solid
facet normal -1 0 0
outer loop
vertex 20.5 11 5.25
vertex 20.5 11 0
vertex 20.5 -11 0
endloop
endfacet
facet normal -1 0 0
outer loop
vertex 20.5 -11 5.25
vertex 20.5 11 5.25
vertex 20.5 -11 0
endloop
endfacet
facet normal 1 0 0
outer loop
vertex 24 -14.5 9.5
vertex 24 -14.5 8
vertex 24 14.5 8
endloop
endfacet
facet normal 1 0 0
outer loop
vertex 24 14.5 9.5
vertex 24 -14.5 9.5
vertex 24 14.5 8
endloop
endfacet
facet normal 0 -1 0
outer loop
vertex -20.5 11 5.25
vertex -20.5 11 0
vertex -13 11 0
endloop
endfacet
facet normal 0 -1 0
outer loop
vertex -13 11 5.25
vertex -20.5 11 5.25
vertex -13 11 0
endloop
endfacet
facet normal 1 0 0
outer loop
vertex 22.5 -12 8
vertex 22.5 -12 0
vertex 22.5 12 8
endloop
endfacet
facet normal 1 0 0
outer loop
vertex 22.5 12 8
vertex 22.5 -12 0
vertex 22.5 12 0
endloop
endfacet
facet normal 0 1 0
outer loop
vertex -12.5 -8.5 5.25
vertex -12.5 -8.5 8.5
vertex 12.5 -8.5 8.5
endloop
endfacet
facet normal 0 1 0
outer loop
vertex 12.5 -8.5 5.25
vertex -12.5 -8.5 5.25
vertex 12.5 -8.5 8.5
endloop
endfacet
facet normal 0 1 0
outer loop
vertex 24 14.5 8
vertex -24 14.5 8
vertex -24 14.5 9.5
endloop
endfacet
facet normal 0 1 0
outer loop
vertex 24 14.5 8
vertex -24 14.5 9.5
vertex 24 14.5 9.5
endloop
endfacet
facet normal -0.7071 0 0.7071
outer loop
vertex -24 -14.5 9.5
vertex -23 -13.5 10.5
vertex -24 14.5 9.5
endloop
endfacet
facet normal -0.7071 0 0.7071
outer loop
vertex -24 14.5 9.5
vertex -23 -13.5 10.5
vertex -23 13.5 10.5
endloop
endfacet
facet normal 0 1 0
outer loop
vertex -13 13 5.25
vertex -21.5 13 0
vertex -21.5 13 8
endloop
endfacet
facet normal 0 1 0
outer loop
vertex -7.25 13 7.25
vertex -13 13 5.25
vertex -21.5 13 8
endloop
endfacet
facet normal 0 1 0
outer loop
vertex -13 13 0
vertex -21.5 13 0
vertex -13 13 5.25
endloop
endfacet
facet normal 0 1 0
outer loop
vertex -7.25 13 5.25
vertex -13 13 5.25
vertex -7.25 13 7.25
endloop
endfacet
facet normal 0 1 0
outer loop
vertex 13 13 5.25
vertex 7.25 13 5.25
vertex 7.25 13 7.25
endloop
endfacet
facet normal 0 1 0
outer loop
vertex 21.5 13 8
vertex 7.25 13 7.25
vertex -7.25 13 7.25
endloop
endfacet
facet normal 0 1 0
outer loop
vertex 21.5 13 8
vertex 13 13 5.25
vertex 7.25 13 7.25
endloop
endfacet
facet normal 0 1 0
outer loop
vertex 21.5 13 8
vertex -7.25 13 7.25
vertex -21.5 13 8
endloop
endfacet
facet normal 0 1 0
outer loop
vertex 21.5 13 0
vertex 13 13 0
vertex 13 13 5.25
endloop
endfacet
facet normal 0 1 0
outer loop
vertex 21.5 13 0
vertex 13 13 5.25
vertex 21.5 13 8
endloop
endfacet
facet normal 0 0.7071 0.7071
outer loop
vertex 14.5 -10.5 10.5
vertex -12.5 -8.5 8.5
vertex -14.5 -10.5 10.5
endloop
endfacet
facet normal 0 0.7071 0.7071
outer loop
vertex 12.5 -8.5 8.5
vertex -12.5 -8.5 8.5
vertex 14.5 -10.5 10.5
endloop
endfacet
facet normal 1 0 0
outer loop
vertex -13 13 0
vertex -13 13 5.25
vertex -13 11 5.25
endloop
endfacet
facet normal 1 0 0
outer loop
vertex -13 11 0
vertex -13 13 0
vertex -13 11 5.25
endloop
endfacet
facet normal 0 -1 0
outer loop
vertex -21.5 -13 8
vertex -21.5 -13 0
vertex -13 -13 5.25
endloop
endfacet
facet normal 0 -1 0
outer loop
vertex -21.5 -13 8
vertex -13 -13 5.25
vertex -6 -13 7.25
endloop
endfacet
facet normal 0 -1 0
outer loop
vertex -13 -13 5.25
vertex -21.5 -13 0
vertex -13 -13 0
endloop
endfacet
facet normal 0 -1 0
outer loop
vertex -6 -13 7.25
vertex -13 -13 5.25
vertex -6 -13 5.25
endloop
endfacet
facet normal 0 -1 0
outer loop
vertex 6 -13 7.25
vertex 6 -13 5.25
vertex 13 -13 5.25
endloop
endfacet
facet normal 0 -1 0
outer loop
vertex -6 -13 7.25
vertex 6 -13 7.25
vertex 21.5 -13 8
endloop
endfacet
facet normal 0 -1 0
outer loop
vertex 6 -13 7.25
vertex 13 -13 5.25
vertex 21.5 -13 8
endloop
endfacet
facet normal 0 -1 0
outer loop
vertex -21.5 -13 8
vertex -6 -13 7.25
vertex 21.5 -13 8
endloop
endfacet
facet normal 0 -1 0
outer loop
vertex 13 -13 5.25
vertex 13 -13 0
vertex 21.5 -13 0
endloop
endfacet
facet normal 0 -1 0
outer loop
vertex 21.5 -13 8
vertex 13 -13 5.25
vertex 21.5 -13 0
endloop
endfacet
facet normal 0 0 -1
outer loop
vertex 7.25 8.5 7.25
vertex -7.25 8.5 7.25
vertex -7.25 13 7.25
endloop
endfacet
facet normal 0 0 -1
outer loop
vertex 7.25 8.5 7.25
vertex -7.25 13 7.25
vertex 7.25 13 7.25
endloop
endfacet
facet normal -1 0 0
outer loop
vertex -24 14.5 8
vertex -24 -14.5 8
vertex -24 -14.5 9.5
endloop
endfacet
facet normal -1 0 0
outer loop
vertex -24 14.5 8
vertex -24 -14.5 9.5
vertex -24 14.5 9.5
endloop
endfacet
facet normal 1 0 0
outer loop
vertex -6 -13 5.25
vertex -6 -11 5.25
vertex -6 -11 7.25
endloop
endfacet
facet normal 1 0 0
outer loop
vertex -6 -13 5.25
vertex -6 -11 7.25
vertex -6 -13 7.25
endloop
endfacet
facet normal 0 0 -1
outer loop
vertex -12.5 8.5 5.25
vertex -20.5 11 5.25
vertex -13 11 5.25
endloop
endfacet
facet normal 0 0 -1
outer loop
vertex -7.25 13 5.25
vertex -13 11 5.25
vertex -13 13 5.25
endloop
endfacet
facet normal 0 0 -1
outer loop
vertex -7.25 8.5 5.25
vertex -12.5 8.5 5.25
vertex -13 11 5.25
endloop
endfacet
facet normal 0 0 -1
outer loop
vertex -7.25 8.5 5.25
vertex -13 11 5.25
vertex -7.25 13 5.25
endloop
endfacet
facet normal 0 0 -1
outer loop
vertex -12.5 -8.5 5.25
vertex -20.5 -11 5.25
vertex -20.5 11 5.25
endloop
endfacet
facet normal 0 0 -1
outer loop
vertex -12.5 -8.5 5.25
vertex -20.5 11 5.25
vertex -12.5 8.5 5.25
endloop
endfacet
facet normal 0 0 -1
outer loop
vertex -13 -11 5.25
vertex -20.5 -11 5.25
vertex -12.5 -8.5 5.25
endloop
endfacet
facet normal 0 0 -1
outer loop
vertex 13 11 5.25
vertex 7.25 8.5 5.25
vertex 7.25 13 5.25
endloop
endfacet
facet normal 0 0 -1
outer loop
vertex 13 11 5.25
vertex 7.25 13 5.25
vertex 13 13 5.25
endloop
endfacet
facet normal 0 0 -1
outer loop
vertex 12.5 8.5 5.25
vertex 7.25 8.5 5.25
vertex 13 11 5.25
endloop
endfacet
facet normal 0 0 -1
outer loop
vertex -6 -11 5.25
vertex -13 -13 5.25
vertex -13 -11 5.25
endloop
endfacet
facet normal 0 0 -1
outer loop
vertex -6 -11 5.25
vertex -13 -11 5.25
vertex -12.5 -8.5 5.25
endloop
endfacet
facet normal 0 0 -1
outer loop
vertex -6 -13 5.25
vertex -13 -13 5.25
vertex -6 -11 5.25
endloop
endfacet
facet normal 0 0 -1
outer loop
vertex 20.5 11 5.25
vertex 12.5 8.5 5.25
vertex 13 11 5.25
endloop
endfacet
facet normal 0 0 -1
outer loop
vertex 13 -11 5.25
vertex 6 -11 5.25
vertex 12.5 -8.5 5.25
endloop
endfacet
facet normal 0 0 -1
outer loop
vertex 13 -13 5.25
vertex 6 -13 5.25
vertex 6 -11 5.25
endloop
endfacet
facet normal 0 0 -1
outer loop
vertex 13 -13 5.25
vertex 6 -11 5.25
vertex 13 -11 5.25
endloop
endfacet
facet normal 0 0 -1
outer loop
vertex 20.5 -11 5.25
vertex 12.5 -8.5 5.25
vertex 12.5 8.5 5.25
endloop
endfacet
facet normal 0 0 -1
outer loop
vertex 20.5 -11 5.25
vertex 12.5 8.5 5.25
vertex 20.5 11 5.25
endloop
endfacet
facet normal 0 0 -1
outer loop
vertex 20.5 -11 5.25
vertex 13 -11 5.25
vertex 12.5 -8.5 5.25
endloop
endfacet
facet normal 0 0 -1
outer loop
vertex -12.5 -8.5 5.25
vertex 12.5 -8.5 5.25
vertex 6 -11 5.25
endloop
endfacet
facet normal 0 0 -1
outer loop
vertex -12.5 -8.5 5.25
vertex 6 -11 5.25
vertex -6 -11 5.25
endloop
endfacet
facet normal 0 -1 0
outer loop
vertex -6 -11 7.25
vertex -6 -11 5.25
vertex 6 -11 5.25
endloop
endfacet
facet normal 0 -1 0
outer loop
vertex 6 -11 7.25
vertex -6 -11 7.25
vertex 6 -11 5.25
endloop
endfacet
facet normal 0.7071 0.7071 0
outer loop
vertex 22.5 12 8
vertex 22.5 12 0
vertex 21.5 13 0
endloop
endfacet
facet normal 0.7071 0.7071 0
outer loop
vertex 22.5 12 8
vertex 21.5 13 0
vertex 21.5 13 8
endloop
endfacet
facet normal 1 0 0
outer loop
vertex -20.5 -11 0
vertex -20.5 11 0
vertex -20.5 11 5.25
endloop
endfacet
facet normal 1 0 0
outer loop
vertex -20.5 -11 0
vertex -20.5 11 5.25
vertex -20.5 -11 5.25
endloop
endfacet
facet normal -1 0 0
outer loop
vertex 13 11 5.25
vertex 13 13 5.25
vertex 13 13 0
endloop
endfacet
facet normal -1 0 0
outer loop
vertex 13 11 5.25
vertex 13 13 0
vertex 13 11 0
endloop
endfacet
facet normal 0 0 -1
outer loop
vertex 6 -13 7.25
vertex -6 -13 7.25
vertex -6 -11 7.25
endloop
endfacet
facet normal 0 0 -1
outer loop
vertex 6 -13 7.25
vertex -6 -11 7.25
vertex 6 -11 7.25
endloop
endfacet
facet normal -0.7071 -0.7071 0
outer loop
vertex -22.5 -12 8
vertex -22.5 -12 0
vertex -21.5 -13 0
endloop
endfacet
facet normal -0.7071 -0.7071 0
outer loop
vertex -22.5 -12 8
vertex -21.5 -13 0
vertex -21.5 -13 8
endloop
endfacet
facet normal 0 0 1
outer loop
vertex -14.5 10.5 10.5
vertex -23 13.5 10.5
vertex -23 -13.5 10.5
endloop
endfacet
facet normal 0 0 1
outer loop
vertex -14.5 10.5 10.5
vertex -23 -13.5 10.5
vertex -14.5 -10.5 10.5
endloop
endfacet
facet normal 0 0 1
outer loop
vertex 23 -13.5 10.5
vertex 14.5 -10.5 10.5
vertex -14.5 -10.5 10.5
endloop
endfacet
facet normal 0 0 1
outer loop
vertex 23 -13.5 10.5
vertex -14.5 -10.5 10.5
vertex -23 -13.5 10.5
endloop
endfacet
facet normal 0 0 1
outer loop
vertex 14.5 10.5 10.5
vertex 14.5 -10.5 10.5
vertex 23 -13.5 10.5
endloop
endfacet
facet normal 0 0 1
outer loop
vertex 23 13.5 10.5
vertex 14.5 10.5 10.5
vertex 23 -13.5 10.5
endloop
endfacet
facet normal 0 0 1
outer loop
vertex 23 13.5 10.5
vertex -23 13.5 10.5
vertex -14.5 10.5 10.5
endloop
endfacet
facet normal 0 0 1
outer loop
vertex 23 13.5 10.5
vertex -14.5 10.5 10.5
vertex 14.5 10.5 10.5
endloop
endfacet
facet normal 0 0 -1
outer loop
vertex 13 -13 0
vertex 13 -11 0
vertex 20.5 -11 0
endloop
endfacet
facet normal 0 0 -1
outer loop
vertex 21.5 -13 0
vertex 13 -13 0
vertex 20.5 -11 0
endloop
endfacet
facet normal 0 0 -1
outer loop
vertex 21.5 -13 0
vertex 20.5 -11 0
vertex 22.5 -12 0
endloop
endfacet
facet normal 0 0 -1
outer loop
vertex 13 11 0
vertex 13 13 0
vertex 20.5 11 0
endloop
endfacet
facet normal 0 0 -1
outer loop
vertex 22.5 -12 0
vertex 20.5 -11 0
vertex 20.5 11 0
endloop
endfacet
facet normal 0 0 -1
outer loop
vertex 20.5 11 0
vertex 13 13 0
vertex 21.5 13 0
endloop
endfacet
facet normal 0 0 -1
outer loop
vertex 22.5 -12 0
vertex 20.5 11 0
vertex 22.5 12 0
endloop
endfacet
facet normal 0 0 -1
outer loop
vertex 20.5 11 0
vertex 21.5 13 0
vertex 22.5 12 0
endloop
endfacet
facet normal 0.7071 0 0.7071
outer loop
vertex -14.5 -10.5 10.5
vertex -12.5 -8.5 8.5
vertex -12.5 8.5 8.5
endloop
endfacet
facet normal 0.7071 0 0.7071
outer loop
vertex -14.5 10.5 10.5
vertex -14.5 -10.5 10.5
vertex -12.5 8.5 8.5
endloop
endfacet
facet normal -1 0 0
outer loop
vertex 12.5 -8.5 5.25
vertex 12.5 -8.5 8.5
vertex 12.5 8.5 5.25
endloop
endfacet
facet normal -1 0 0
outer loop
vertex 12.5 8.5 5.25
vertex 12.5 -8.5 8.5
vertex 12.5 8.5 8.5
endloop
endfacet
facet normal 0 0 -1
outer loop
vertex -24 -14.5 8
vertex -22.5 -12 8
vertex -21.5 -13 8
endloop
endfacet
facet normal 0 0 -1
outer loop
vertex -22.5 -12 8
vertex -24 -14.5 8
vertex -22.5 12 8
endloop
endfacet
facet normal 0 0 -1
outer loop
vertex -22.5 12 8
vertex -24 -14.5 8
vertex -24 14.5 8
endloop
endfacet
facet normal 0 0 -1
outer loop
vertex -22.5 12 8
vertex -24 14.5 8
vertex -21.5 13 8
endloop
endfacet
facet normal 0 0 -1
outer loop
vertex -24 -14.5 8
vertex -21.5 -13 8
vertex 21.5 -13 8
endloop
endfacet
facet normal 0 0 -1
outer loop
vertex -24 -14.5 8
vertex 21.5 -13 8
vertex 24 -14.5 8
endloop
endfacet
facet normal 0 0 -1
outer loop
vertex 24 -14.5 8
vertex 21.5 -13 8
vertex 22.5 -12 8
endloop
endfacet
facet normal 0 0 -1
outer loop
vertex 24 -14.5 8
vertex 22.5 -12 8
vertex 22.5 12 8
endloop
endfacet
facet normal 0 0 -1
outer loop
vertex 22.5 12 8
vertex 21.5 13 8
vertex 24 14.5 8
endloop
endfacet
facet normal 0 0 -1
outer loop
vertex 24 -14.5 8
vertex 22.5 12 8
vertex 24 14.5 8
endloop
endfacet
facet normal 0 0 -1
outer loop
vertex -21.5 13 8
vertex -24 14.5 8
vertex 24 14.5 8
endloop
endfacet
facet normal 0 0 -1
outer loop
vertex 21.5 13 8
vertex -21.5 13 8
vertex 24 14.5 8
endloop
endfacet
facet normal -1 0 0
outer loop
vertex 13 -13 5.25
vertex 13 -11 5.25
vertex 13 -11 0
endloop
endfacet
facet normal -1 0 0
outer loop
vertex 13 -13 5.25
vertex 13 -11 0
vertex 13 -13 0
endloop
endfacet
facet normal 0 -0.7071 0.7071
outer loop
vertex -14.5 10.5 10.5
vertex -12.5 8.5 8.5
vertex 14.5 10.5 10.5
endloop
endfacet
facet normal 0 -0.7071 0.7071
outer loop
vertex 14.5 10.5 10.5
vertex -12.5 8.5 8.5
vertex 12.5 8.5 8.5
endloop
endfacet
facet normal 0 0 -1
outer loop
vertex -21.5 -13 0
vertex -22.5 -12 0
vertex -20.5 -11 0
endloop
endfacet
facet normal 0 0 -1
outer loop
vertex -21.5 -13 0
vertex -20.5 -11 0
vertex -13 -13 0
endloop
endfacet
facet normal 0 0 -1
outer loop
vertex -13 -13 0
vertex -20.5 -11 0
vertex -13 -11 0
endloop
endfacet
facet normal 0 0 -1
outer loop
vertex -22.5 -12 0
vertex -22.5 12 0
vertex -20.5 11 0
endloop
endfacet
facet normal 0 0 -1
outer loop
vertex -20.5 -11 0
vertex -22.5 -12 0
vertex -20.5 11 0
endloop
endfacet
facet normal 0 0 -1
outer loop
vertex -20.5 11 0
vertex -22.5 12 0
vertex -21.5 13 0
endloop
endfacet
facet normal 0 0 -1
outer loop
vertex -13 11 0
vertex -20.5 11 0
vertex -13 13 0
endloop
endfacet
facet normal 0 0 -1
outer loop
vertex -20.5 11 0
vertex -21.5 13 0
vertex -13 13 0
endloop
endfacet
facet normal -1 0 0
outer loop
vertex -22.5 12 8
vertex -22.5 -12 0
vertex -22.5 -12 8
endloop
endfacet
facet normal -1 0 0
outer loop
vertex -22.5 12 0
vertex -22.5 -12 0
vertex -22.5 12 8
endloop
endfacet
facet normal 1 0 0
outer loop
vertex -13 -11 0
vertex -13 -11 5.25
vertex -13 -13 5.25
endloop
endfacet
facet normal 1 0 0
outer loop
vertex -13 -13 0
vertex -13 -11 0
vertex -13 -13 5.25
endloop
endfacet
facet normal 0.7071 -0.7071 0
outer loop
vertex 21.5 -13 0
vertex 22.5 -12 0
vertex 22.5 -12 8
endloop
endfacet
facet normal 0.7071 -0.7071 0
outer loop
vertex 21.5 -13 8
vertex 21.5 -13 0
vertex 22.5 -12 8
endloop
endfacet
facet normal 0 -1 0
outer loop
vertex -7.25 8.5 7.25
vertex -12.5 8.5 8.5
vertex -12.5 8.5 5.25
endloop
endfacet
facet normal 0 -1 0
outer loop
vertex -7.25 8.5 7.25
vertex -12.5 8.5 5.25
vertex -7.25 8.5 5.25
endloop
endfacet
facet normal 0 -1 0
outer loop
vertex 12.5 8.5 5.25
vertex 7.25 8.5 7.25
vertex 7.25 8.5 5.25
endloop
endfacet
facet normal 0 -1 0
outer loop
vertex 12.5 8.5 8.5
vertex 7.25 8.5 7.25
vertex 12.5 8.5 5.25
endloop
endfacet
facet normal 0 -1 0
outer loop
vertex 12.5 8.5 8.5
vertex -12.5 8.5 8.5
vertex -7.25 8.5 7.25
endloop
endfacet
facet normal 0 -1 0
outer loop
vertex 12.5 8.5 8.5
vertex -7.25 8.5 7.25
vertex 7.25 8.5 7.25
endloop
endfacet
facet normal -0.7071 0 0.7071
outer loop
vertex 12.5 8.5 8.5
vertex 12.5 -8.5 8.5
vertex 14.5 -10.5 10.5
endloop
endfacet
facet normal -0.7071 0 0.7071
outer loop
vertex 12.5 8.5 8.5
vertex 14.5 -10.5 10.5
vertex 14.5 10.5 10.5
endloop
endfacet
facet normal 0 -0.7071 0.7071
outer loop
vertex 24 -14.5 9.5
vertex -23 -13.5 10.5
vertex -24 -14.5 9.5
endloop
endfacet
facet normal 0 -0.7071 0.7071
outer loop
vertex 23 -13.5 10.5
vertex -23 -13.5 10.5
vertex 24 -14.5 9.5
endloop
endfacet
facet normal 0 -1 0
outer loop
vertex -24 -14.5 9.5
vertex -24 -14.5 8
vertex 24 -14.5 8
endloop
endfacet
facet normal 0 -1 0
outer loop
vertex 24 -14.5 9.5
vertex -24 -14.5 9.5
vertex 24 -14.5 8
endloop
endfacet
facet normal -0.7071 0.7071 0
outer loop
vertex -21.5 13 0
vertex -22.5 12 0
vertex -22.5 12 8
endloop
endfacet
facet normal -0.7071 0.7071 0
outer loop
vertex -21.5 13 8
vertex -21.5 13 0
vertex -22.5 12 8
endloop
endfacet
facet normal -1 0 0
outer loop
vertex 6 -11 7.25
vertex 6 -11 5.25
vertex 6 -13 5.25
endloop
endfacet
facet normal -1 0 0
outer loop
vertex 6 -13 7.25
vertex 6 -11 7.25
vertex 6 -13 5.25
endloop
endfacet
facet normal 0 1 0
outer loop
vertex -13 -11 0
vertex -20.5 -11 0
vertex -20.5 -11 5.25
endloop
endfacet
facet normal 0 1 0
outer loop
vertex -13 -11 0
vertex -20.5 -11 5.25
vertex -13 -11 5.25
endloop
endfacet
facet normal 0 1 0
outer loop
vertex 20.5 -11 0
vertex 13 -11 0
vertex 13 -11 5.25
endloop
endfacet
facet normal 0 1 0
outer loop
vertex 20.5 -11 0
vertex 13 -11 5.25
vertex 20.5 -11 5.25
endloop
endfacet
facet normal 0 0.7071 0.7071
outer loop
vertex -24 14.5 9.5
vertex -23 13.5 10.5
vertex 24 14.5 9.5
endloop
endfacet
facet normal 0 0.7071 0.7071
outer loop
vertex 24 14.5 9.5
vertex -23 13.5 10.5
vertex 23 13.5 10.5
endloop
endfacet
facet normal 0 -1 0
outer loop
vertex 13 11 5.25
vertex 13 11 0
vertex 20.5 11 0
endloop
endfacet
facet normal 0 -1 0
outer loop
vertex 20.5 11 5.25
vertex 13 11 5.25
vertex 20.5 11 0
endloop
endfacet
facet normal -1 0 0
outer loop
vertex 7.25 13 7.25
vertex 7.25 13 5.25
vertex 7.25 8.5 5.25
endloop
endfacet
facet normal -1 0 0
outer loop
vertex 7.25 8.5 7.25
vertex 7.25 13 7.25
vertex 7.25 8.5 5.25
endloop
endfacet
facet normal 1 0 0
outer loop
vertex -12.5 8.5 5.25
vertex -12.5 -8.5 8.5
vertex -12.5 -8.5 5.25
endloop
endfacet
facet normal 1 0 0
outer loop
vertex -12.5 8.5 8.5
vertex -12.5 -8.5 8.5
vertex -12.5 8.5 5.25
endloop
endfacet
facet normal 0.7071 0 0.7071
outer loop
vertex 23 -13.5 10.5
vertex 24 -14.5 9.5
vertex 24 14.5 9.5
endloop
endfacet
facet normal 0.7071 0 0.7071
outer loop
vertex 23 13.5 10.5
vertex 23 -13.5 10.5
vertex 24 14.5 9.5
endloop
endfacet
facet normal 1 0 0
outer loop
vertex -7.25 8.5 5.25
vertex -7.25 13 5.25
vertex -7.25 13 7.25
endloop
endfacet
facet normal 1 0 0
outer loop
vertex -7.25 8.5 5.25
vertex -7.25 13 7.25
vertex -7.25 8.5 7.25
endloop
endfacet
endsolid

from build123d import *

# Parameters (mm, degrees)
SKETCH_W        = 45
SKETCH_H        = 26
PAD_DEPTH       = 8
SKETCH001_W     = 48
SKETCH001_H     = 29
PAD001_DEPTH    = 2.5
SKETCH002_W     = 25
SKETCH002_H     = 17
POCKET_DEPTH    = 10.501
SKETCH003_W     = 41
SKETCH003_H     = 22
POCKET001_DEPTH = 5.25
SKETCH004_W     = 26
SKETCH004_H     = 27.5
POCKET002_DEPTH = 5.251
SKETCH005_W     = 12
SKETCH005_H     = 2.5
POCKET003_DEPTH = 2
SKETCH006_W     = 14.5
SKETCH006_H     = 4.5
POCKET004_DEPTH = 2
CHAMFER_SIZE    = 1
CHAMFER001_SIZE = 2
CHAMFER002_SIZE = 1


with BuildPart() as part:
    # Sketch → Pad (new body)
    with BuildSketch(Plane.XY):
        Rectangle(SKETCH_W, SKETCH_H)
    extrude(amount=PAD_DEPTH)

    # Sketch001 (on Face6 of Pad) → Pad001 (join)
    with BuildSketch(Plane.XY.offset(8)):
        Rectangle(SKETCH001_W, SKETCH001_H)
    extrude(amount=PAD001_DEPTH)

    # Sketch002 (on Face5 of Pad001) → Pocket (cut, through all)
    with BuildSketch(Plane.XY.offset(10.5)):
        Rectangle(SKETCH002_W, SKETCH002_H)
    extrude(amount=-POCKET_DEPTH, mode=Mode.SUBTRACT)

    # Sketch003 (on Face15 of Pocket) → Pocket001 (cut)
    with BuildSketch(Plane(origin=(0, 0, 0), x_dir=(1, 0, 0), z_dir=(0, 0, -1))):
        Rectangle(SKETCH003_W, SKETCH003_H)
    extrude(amount=-POCKET001_DEPTH, mode=Mode.SUBTRACT)

    # Sketch004 (on Face16 of Pocket001) → Pocket002 (cut, through all)
    with BuildSketch(Plane(origin=(0, 0, 5.25), x_dir=(1, 0, 0), z_dir=(0, 0, -1))):
        Rectangle(SKETCH004_W, SKETCH004_H)
    extrude(amount=POCKET002_DEPTH, mode=Mode.SUBTRACT)

    # Sketch005 (on Face17 of Pocket002) → Pocket003 (cut)
    with BuildSketch(Plane(origin=(0, 0, 5.25), x_dir=(1, 0, 0), z_dir=(0, 0, -1))):
        with Locations((0, 12.25)):
            Rectangle(SKETCH005_W, SKETCH005_H)
    extrude(amount=-POCKET003_DEPTH, mode=Mode.SUBTRACT)

    # Sketch006 (on Face27 of Pocket003) → Pocket004 (cut)
    with BuildSketch(Plane(origin=(0, 0, 5.25), x_dir=(1, 0, 0), z_dir=(0, 0, -1))):
        with Locations((0, -10.75)):
            Rectangle(SKETCH006_W, SKETCH006_H)
    extrude(amount=-POCKET004_DEPTH, mode=Mode.SUBTRACT)

    # Chamfer
    chamfer_edges = [part.edges().sort_by_distance(p)[0] for p in [
        (24, 0, 10.5),
        (0, -14.5, 10.5),
        (0, 14.5, 10.5),
        (-24, 0, 10.5),
    ]]
    chamfer(chamfer_edges, length=CHAMFER_SIZE)

    # Chamfer001
    chamfer001_edges = [part.edges().sort_by_distance(p)[0] for p in [
        (0, 8.5, 10.5),
        (-12.5, 0, 10.5),
        (0, -8.5, 10.5),
        (12.5, 0, 10.5),
    ]]
    chamfer(chamfer001_edges, length=CHAMFER001_SIZE)

    # Chamfer002
    chamfer002_edges = [part.edges().sort_by_distance(p)[0] for p in [
        (-22.5, 13, 4),
        (-22.5, -13, 4),
        (22.5, 13, 4),
        (22.5, -13, 4),
    ]]
    chamfer(chamfer002_edges, length=CHAMFER002_SIZE)


solid = part.part
